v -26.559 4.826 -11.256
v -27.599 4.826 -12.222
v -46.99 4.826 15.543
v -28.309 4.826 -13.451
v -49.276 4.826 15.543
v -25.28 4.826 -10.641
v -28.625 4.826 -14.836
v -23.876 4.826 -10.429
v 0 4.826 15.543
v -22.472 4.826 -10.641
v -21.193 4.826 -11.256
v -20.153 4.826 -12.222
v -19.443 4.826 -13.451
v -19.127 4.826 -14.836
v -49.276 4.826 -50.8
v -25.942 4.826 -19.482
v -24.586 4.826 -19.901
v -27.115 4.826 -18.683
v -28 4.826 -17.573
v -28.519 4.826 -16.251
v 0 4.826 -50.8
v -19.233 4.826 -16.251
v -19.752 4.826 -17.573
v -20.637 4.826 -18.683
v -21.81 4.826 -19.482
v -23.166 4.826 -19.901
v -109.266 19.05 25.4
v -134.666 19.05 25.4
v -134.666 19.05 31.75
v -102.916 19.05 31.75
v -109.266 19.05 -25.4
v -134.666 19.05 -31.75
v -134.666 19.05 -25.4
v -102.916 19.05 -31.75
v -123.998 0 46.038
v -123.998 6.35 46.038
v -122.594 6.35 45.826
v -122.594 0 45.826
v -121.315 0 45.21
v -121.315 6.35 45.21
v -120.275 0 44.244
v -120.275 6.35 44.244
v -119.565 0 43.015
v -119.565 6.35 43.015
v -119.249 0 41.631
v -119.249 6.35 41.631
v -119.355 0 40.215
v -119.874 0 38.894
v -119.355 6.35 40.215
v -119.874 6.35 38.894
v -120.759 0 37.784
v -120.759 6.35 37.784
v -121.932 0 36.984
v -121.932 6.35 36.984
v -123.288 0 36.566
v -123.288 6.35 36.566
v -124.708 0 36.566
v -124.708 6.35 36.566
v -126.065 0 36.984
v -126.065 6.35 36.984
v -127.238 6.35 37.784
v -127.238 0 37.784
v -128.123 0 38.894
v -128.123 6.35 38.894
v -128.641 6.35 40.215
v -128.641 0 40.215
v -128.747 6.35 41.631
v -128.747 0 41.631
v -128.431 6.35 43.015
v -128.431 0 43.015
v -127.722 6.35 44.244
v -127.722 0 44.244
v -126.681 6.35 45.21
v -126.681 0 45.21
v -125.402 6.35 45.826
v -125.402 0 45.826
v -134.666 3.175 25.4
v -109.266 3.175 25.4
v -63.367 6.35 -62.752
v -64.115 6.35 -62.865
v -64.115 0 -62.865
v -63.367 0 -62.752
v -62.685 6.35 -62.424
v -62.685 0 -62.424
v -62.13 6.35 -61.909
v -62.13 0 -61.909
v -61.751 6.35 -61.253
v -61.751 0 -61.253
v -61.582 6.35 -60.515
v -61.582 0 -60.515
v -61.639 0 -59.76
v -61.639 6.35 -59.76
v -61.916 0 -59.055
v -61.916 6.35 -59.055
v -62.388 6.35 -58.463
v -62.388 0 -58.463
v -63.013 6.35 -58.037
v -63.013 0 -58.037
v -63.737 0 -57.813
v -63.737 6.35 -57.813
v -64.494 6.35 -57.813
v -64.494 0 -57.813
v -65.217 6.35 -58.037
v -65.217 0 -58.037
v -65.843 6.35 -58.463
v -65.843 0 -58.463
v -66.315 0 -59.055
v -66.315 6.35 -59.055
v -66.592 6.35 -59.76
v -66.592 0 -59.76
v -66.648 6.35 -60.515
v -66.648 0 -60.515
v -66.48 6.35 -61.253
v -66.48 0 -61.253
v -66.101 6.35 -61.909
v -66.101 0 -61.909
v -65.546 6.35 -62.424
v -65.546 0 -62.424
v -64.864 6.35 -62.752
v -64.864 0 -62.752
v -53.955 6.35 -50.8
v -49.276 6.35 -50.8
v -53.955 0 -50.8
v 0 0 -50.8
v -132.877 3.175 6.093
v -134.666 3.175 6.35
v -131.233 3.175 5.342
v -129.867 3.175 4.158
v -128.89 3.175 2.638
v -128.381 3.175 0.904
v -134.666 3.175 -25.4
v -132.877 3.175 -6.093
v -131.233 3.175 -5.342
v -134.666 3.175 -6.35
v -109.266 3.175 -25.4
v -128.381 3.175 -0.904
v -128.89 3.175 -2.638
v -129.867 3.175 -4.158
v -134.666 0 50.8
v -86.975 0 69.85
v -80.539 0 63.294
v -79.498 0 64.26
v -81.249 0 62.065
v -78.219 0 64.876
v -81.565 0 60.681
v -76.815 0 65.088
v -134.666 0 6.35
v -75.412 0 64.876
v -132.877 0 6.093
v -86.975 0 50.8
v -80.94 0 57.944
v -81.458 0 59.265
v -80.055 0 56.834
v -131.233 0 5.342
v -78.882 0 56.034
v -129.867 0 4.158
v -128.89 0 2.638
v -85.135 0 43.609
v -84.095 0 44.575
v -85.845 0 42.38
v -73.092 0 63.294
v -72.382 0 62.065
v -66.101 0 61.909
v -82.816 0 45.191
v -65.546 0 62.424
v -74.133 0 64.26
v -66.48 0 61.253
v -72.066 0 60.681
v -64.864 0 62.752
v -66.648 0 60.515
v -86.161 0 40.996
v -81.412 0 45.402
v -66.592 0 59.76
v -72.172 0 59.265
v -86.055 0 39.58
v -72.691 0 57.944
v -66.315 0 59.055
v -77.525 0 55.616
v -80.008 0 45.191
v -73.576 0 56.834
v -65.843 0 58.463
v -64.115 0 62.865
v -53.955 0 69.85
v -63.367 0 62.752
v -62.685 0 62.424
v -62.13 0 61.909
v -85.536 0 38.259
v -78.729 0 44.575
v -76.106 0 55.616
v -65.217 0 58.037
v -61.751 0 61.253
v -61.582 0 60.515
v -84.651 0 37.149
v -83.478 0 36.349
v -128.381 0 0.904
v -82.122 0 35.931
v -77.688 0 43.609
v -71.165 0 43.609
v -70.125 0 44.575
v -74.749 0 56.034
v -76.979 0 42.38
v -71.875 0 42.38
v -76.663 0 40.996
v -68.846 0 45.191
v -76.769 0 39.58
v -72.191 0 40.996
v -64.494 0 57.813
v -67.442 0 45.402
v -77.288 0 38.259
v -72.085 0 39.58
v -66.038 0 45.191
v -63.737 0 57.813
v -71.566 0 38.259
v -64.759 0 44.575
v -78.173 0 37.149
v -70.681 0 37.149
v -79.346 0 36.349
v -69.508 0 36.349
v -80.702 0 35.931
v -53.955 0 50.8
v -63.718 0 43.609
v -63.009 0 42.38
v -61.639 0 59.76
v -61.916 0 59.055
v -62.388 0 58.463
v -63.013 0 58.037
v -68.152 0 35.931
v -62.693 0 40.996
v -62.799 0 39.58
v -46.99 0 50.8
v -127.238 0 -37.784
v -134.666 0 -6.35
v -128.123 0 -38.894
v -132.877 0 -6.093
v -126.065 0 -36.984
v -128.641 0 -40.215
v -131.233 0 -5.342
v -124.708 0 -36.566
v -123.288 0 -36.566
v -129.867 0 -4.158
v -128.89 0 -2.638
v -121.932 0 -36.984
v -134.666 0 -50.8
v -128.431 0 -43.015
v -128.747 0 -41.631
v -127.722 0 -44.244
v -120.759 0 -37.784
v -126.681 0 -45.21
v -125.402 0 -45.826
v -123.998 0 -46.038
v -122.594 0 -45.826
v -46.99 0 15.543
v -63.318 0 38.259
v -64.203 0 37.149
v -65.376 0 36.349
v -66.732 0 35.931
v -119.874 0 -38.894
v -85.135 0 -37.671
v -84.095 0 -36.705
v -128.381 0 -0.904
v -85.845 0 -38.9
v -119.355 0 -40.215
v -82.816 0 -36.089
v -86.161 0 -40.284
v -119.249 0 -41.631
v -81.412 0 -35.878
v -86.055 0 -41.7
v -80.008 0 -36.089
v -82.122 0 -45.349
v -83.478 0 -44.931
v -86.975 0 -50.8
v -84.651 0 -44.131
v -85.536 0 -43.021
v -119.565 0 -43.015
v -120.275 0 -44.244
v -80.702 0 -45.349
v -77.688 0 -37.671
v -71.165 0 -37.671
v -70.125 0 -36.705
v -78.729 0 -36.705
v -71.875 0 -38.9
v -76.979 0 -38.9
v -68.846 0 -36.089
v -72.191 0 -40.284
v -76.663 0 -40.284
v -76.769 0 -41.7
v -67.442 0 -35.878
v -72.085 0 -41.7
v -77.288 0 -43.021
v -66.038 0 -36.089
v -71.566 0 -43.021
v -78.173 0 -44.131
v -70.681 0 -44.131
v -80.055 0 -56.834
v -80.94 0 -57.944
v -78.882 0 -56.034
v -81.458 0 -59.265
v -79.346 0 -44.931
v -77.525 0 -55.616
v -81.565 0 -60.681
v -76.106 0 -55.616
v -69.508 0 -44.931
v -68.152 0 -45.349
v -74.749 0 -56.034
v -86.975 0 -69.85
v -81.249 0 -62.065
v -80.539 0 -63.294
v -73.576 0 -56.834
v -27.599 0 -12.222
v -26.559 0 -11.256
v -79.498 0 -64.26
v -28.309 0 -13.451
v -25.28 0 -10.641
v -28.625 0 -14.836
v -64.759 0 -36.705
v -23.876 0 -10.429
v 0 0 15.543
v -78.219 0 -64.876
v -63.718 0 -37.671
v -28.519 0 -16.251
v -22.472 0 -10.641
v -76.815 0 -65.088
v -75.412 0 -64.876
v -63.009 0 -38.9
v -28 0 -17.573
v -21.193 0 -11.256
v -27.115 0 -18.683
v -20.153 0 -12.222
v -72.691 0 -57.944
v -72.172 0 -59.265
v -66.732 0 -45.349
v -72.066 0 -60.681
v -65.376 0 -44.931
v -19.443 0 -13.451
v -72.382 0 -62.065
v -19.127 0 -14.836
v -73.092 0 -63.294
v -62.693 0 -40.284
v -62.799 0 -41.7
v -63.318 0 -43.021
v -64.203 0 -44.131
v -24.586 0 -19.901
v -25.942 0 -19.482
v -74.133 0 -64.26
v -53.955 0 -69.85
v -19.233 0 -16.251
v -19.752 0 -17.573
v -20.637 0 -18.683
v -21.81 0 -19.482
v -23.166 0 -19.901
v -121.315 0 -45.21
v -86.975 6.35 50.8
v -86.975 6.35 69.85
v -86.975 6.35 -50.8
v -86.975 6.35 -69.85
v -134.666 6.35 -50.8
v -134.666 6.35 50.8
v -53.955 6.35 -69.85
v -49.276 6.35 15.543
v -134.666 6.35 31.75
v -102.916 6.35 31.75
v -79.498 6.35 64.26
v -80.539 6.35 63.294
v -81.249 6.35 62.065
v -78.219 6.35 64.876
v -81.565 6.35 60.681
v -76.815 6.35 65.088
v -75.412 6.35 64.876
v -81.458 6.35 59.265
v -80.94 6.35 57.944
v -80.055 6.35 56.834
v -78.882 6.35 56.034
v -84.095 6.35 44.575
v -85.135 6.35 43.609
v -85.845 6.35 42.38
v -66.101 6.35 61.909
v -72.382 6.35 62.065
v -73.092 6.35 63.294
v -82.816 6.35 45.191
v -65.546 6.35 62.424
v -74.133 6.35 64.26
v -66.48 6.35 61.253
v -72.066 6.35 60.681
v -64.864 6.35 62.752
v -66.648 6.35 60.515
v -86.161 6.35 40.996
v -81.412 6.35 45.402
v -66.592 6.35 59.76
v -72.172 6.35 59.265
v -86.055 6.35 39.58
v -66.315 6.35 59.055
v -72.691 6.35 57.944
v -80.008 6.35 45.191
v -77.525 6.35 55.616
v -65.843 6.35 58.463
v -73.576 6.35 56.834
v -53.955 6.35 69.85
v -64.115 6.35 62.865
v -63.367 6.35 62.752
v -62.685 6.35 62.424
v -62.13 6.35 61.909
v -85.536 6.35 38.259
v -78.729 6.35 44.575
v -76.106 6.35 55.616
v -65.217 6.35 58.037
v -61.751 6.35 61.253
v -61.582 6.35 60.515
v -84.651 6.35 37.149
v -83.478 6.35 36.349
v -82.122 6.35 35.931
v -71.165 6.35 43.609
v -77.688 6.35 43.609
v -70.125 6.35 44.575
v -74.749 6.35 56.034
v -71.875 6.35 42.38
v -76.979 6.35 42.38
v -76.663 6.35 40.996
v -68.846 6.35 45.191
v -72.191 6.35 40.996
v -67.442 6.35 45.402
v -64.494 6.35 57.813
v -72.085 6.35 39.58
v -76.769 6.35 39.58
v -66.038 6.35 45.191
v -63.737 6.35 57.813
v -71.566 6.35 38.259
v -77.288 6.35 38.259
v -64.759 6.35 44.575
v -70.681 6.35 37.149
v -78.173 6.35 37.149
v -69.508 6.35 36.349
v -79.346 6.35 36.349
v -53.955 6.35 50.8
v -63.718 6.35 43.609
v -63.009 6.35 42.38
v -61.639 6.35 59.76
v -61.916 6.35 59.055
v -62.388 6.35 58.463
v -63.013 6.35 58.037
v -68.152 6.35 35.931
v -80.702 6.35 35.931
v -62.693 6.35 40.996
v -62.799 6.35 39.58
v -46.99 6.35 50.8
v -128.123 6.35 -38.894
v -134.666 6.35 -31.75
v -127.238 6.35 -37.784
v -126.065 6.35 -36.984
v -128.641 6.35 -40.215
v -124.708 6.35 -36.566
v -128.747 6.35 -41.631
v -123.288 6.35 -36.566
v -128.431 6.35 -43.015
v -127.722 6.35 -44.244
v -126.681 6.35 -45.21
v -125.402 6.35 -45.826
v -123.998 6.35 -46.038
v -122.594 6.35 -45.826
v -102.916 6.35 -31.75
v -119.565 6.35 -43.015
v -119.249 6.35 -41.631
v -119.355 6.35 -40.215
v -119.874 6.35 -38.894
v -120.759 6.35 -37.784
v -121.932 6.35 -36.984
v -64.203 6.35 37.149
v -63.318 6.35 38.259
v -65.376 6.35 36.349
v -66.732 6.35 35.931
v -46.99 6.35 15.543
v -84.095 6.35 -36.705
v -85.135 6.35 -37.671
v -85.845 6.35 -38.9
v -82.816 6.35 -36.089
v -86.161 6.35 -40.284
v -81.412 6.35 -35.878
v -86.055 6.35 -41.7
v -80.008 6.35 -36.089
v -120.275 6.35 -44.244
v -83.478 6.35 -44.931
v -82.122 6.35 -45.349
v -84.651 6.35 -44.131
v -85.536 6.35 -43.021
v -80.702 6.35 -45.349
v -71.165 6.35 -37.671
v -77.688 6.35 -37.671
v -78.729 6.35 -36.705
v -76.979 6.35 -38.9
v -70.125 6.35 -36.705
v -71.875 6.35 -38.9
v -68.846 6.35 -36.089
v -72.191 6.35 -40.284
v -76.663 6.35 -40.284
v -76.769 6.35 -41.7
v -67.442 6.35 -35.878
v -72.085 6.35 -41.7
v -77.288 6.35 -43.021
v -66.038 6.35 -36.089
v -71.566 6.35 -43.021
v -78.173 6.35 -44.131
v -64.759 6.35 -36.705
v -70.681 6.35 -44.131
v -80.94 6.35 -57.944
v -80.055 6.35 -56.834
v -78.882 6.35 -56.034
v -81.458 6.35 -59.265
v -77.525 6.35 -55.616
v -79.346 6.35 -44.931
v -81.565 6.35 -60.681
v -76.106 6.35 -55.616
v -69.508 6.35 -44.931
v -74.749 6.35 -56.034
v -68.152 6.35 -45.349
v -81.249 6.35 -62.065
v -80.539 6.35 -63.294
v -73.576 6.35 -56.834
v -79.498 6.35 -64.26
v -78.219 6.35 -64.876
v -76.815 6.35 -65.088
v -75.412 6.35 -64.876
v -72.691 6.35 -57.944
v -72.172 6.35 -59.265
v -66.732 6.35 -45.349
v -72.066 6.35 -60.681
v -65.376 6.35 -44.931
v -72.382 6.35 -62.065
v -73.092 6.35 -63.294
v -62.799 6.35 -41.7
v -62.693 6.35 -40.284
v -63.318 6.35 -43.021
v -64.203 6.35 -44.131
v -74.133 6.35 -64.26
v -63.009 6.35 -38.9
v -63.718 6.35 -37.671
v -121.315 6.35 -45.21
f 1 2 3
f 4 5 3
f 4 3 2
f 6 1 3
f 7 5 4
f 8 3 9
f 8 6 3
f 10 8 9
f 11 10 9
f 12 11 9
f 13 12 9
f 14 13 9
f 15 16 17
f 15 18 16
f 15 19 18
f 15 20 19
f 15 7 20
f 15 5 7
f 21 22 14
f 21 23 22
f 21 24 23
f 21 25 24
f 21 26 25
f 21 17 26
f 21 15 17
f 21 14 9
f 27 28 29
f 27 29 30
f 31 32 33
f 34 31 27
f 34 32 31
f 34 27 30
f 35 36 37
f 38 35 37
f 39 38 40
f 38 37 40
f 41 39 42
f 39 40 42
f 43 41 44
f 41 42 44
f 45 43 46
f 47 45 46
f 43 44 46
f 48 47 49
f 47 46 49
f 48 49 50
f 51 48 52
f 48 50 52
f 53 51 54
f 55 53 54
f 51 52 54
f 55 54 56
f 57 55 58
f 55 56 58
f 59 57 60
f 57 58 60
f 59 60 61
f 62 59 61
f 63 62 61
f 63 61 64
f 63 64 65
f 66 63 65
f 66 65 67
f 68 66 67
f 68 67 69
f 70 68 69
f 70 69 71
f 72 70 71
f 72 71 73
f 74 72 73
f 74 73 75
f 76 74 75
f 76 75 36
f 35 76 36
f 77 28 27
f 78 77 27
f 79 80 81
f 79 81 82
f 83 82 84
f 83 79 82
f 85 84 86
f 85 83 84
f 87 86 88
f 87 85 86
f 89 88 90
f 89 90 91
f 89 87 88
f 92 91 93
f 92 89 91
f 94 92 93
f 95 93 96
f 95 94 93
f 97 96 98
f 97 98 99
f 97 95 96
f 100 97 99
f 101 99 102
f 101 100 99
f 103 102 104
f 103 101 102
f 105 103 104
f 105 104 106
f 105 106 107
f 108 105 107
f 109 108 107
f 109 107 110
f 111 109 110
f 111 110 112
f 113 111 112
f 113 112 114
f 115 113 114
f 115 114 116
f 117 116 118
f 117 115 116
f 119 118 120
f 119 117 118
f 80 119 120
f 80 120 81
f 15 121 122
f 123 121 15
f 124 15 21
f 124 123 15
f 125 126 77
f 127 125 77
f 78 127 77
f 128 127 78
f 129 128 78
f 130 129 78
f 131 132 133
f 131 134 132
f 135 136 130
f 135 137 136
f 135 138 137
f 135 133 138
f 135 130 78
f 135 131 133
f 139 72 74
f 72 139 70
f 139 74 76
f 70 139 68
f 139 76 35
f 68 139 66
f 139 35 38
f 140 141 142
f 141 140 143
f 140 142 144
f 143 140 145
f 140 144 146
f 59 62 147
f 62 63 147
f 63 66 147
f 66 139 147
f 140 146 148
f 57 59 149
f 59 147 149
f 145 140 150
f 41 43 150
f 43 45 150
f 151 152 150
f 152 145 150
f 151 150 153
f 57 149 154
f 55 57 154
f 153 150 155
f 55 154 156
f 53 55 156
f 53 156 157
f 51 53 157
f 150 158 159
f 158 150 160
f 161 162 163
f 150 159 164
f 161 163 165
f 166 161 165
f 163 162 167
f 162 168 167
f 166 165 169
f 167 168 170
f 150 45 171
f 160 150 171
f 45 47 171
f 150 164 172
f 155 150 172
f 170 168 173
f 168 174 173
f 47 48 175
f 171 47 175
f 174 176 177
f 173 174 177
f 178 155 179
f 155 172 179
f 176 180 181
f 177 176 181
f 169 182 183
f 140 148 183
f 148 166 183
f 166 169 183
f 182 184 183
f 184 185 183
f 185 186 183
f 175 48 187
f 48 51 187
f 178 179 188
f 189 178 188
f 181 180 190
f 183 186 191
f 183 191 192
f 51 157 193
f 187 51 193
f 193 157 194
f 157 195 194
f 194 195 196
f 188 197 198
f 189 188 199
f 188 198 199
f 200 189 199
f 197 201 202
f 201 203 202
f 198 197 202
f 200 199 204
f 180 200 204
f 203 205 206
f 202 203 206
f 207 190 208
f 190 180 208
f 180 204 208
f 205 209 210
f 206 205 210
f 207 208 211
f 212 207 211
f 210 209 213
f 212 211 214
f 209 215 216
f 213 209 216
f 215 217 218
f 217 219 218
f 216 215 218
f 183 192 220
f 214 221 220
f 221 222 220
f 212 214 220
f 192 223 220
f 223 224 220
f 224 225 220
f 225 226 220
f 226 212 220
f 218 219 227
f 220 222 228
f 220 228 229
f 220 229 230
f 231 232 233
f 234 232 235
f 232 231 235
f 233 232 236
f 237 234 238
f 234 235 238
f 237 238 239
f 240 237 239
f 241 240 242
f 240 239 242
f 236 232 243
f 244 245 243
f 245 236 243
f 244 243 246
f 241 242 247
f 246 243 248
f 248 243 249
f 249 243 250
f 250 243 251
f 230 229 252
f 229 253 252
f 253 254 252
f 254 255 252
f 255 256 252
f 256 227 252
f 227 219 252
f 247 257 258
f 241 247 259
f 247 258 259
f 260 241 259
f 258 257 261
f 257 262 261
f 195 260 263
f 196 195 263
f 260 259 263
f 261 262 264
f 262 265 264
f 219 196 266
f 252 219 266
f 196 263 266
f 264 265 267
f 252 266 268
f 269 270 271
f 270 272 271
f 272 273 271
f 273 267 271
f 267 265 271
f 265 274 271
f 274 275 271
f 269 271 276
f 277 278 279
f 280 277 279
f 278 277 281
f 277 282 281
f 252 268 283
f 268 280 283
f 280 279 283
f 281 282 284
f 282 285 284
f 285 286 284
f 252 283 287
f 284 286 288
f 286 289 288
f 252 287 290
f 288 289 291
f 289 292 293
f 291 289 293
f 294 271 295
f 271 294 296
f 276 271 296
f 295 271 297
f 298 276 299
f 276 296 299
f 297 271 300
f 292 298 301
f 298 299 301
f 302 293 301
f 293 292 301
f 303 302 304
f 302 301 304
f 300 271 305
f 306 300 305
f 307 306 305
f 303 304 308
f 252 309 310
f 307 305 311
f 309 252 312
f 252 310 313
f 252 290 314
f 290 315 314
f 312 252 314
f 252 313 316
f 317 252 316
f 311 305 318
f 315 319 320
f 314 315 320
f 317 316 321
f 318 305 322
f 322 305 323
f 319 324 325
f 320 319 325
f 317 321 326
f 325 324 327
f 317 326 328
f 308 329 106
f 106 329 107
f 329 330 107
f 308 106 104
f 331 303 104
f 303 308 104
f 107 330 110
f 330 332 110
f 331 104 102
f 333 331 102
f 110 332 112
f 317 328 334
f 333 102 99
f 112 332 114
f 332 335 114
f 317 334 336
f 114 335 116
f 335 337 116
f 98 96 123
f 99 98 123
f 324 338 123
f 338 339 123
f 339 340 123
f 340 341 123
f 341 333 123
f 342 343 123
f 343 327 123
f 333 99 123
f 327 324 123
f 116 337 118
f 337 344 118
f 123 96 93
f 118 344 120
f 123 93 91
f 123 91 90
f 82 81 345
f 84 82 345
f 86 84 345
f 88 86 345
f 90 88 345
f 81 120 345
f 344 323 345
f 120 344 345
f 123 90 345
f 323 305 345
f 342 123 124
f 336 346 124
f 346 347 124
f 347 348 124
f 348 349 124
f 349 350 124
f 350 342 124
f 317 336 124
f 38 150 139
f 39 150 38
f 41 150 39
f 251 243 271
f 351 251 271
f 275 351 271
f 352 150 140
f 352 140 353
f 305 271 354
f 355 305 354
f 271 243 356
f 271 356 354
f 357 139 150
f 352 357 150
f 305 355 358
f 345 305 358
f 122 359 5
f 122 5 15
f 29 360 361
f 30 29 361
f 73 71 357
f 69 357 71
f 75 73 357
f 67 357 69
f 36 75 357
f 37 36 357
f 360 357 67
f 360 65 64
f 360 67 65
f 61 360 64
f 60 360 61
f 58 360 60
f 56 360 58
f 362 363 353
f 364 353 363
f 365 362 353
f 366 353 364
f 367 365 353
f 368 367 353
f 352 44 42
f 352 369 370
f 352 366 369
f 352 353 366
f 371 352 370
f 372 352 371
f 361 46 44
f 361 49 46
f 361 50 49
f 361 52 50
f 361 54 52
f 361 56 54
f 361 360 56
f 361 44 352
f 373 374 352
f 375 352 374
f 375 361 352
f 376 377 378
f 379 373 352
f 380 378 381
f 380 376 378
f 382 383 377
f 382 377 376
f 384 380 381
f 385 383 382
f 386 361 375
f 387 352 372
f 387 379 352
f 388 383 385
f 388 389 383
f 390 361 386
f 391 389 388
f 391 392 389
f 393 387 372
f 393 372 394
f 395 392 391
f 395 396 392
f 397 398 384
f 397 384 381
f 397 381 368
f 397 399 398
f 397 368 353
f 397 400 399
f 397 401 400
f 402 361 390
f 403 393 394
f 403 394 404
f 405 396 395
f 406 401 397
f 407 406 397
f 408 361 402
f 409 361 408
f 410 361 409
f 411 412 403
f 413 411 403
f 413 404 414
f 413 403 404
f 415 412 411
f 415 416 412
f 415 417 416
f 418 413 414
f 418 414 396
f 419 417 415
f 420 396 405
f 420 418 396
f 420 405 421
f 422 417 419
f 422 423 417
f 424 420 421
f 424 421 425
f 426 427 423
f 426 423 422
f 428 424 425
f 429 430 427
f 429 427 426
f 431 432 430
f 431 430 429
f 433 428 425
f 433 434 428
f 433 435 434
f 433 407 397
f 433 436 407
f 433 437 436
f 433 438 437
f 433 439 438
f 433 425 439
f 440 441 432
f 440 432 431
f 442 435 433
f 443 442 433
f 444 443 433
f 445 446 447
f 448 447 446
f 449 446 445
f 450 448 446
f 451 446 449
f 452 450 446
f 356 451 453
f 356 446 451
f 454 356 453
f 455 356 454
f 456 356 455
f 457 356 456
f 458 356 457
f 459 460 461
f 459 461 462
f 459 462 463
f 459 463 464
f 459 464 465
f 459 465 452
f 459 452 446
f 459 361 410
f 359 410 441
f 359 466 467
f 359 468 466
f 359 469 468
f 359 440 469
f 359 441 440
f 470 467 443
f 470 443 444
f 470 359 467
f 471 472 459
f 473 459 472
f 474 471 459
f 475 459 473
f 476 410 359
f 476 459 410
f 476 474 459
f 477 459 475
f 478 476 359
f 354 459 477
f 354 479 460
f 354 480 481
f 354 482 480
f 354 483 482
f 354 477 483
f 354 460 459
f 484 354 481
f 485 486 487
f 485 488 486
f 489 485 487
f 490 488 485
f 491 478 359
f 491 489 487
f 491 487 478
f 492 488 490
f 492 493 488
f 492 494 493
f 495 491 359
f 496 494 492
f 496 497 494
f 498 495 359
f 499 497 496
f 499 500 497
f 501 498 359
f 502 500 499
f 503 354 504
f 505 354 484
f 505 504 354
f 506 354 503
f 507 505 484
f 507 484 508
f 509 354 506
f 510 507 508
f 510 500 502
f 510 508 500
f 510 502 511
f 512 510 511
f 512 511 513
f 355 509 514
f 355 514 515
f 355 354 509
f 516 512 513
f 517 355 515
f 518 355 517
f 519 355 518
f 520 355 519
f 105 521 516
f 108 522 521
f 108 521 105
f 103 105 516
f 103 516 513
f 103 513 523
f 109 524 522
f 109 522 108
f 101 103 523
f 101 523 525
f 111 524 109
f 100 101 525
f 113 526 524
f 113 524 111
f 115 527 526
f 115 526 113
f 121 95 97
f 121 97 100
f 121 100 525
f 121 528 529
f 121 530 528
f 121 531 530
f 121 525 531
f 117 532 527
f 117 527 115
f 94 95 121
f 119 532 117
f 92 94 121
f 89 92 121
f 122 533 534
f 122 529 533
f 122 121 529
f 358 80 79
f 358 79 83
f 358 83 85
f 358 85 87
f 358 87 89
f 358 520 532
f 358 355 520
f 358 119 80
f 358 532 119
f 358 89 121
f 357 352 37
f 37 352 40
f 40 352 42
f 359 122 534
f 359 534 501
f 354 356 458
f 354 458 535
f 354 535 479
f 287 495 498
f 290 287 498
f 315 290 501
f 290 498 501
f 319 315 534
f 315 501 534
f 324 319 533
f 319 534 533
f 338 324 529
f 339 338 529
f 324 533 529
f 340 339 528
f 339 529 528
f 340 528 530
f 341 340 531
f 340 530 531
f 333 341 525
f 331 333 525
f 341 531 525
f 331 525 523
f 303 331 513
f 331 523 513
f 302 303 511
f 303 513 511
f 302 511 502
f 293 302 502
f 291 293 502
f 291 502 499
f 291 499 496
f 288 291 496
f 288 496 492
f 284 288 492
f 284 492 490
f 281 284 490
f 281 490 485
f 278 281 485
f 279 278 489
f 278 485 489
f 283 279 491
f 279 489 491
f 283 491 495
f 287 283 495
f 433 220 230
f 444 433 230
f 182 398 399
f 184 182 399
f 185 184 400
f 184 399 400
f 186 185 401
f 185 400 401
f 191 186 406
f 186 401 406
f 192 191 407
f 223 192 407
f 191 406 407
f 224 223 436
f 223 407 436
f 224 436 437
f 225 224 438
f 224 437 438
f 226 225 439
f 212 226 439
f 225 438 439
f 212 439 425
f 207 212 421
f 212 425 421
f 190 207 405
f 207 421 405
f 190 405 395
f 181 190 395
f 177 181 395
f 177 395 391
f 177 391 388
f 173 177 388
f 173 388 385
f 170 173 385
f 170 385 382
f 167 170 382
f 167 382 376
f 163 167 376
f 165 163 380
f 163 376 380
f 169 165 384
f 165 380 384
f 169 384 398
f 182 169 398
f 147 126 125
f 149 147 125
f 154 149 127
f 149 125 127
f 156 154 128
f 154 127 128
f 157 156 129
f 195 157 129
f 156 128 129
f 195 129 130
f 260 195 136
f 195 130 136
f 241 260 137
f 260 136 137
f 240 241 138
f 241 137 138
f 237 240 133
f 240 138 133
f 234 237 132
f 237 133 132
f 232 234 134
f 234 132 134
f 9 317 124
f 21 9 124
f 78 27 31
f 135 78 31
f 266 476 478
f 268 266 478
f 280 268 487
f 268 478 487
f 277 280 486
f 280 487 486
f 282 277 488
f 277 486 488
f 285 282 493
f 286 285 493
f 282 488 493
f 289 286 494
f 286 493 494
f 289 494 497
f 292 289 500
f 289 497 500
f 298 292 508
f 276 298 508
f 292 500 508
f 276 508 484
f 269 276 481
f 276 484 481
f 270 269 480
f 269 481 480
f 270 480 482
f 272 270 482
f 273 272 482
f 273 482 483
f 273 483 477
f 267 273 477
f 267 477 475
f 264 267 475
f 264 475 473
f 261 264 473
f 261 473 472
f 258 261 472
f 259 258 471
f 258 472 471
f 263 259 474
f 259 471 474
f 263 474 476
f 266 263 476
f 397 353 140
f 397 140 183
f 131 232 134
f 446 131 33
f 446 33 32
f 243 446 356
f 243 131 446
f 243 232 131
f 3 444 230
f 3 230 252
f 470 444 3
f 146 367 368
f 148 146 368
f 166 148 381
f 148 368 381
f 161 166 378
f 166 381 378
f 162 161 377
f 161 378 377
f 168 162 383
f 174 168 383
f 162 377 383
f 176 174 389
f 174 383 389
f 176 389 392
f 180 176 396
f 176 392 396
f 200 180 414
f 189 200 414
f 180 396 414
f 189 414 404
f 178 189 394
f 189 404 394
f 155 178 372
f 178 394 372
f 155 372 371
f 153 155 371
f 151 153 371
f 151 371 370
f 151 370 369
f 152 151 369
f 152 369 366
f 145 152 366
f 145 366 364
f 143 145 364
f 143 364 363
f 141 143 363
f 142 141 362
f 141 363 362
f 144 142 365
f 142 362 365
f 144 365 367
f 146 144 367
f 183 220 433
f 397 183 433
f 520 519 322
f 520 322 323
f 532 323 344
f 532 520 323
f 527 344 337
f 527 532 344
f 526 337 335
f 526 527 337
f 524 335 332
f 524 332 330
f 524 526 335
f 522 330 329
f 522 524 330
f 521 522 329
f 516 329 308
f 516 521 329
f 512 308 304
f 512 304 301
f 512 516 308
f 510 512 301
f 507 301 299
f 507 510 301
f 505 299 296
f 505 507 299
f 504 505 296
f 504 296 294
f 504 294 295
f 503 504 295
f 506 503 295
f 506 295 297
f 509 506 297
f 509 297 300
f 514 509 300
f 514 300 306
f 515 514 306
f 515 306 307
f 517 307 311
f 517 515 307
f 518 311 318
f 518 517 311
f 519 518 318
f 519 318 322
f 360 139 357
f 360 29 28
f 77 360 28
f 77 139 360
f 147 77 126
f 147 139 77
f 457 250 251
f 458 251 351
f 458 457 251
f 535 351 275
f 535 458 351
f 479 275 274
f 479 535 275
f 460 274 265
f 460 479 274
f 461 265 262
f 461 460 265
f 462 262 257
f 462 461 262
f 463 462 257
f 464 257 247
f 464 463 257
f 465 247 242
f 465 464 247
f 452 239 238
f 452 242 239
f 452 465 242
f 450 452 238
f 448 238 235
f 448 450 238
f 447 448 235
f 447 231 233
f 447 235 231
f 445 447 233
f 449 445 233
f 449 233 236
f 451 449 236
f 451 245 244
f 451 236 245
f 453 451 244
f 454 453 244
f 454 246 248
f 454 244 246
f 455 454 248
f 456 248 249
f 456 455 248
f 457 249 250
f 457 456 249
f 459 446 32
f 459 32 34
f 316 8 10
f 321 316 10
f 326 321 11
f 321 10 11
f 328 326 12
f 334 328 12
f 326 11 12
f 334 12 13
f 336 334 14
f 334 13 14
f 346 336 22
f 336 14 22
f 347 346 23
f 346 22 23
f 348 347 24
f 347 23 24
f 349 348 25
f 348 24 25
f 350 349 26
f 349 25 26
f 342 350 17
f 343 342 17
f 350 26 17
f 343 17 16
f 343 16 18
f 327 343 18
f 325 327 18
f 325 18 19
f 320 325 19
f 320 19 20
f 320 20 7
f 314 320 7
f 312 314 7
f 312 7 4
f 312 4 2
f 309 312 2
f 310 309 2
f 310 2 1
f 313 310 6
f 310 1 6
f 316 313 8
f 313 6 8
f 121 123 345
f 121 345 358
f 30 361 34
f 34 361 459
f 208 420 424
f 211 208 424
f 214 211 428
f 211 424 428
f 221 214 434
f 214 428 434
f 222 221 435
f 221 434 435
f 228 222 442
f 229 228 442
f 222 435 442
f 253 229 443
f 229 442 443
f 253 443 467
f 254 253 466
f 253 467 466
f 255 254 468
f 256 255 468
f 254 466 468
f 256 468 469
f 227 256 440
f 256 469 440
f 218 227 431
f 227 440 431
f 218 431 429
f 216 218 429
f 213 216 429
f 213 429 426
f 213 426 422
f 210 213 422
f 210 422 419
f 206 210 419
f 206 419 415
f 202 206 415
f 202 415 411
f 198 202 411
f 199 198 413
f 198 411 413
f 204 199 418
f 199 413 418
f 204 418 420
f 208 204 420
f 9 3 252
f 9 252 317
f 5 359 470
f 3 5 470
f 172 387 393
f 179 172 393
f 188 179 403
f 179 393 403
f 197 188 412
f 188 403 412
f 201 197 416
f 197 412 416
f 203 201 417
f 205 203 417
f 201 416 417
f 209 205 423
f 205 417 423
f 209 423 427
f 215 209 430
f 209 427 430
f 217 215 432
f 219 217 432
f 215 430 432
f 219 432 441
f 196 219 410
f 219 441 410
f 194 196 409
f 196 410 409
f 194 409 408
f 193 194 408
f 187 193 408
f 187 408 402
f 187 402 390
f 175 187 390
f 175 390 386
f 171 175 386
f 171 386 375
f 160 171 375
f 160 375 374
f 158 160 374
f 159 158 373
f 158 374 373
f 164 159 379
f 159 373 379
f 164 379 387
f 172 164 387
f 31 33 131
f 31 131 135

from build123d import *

# Parameters (mm, degrees)
SKETCH1_W                 = 279.4
SKETCH1_H                 = 101.6
BOSS_EXTRUDE1_DEPTH       = 6.35
SKETCH2_R                 = 13.97
BOSS_EXTRUDE3_DEPTH       = 5.55625
SKETCH9_R                 = 11.1125
CUT_EXTRUDE4_DEPTH        = 4.445
CUT_EXTRUDE5_START        = -5.55625
SKETCH10_R                = 11.1125
CUT_EXTRUDE5_DEPTH        = 5.55625
SKETCH11_R                = 7.9375
CUT_EXTRUDE6_DEPTH        = 285.078633923
SKETCH12_R                = 6.35
CUT_EXTRUDE7_DEPTH        = 285.051619429
SKETCH22_W                = 63.5
SKETCH22_H                = 63.5
BOSS_EXTRUDE7_DEPTH       = 12.7
SKETCH25_W                = 50.8
SKETCH25_H                = 50.8
CUT_EXTRUDE11_DEPTH       = 15.875
SKETCH32_R                = 4.7625
CUT_EXTRUDE12_DEPTH       = 6.35
SKETCH38_W                = 46.99
SKETCH38_H                = 18.470251096
CUT_EXTRUDE13_DEPTH       = 6.35
SKETCH60_R                = 4.7625
CUT_EXTRUDE23_DEPTH       = 6.35
SKETCH64_R                = 4.7625
CUT_EXTRUDE24_DEPTH       = 285.264471927
SKETCH69_W                = 33.02
SKETCH69_H                = 6.35
BOSS_EXTRUDE10_DEPTH      = 19.05
SKETCH70_R                = 4.7625
SKETCH70_R_2              = 2.54
CUT_EXTRUDE26_DEPTH       = 6.35
SKETCH76_R                = 4.7625
CUT_EXTRUDE29_DEPTH       = 6.35
SKETCH77_W                = 46.99
SKETCH77_H                = 16.7871648
CUT_EXTRUDE30_DEPTH       = 6.35
SKETCH78_W                = 49.276
SKETCH78_H                = 66.342584104
CUT_EXTRUDE32_DEPTH       = 1.524
SKETCH79_R                = 4.7625
CUT_EXTRUDE33_DEPTH       = 4.826
CUT_EXTRUDE34_START       = -3.175
CUT_EXTRUDE34_OUTLINE_R   = 4.7625
CUT_EXTRUDE34_OUTLINE_R_2 = 7.9375
CUT_EXTRUDE34_DEPTH       = 19.05


# Read off the part's stored shape, not the designer's step: Cut-Extrude34
with BuildPart() as part:
    # Sketch1 → Boss-Extrude1 (new body)
    with BuildSketch(Plane(origin=(0, 0, 0), x_dir=(1, 0, 0), z_dir=(0, 1, 0))):
        with Locations((-139.7, 0)):
            Rectangle(SKETCH1_W, SKETCH1_H)
    extrude(amount=BOSS_EXTRUDE1_DEPTH)

    # Sketch2 → Boss-Extrude3 (add)
    with BuildSketch(Plane(origin=(0, 6.35, 0), x_dir=(1, 0, 0), z_dir=(0, 1, 0))):
        with Locations(Location((-258.510557857, 0, 0), (0, 0, 90))):
            Circle(SKETCH2_R)
    extrude(amount=BOSS_EXTRUDE3_DEPTH)

    # Sketch9 → Cut-Extrude4 (cut)
    with BuildSketch(Plane(origin=(0, 11.90625, 0), x_dir=(1, 0, 0), z_dir=(0, 1, 0))):
        with Locations(Location((-258.510557857, 0, 0), (0, 0, 270))):
            Circle(SKETCH9_R)
    extrude(amount=-CUT_EXTRUDE4_DEPTH, mode=Mode.SUBTRACT)

    # Sketch10 → Cut-Extrude5 (cut)
    with BuildSketch(Plane(origin=(0, 0, 0), x_dir=(-1, 0, 0), z_dir=(0, -1, 0)).offset(CUT_EXTRUDE5_START)):
        with Locations(Location((258.510557857, 0, 0), (0, 0, 270))):
            Circle(SKETCH10_R)
    extrude(amount=CUT_EXTRUDE5_DEPTH, mode=Mode.SUBTRACT)

    # Sketch11 → Cut-Extrude6 (cut, through all)
    with BuildSketch(Plane(origin=(0, 7.46125, 0), x_dir=(1, 0, 0), z_dir=(0, 1, 0))):
        with Locations(Location((-258.510557857, 0, 0), (0, 0, 270))):
            Circle(SKETCH11_R)
    extrude(amount=-CUT_EXTRUDE6_DEPTH, mode=Mode.SUBTRACT)

    # Sketch12 → Cut-Extrude7 (cut, through all)
    with BuildSketch(Plane(origin=(0, 6.35, 0), x_dir=(1, 0, 0), z_dir=(0, 1, 0))):
        with Locations(Location((-134.666203771, 0, 0), (0, 0, 270))):
            Circle(SKETCH12_R)
    extrude(amount=-CUT_EXTRUDE7_DEPTH, mode=Mode.SUBTRACT)

    # Sketch22 → Boss-Extrude7 (add)
    with BuildSketch(Plane(origin=(0, 6.35, 0), x_dir=(1, 0, 0), z_dir=(0, 1, 0))):
        with Locations((-134.666203771, 0)):
            Rectangle(SKETCH22_W, SKETCH22_H)
    extrude(amount=BOSS_EXTRUDE7_DEPTH)

    # Sketch25 → Cut-Extrude11 (cut)
    with BuildSketch(Plane(origin=(0, 19.05, 0), x_dir=(1, 0, 0), z_dir=(0, 1, 0))):
        with Locations((-134.666203771, 0)):
            Rectangle(SKETCH25_W, SKETCH25_H)
    extrude(amount=-CUT_EXTRUDE11_DEPTH, mode=Mode.SUBTRACT)

    # Sketch32 → Cut-Extrude12 (cut)
    with BuildSketch(Plane(origin=(0, 6.35, 0), x_dir=(1, 0, 0), z_dir=(0, 1, 0))):
        with Locations(Location((-67.44195898, -40.64, 0), (0, 0, 270))):
            Circle(SKETCH32_R)
        with Locations(Location((-81.41195898, -40.64, 0), (0, 0, 270))):
            Circle(SKETCH32_R)
        with Locations(Location((-67.44195898, 40.64, 0), (0, 0, 270))):
            Circle(SKETCH32_R)
        with Locations(Location((-81.41195898, 40.64, 0), (0, 0, 270))):
            Circle(SKETCH32_R)
    extrude(amount=-CUT_EXTRUDE12_DEPTH, mode=Mode.SUBTRACT)

    # Sketch38 → Cut-Extrude13 (cut)
    with BuildSketch(Plane(origin=(0, 6.35, 0), x_dir=(1, 0, 0), z_dir=(0, 1, 0))):
        with Locations((-23.495, -24.777709652)):
            Rectangle(SKETCH38_W, SKETCH38_H)
    extrude(amount=-CUT_EXTRUDE13_DEPTH, mode=Mode.SUBTRACT)

    # Sketch60 → Cut-Extrude23 (cut)
    with BuildSketch(Plane(origin=(0, 6.35, 0), x_dir=(1, 0, 0), z_dir=(0, 1, 0))):
        with Locations(Location((-231.7492444, 41.324145444, 0), (0, 0, 270))):
            Circle(SKETCH60_R)
        with Locations(Location((-231.7492444, -39.369341378, 0), (0, 0, 270))):
            Circle(SKETCH60_R)
        with Locations(Location((-173.509244294, -39.369341378, 0), (0, 0, 270))):
            Circle(SKETCH60_R)
        with Locations(Location((-173.509244294, 41.324145444, 0), (0, 0, 270))):
            Circle(SKETCH60_R)
    extrude(amount=-CUT_EXTRUDE23_DEPTH, mode=Mode.SUBTRACT)

    # Sketch64 → Cut-Extrude24 (cut, through all)
    with BuildSketch(Plane(origin=(0, 6.35, 0), x_dir=(1, 0, 0), z_dir=(0, 1, 0))):
        with Locations(Location((-145.334203771, -41.275, 0), (0, 0, 270))):
            Circle(SKETCH64_R)
        with Locations(Location((-123.998203771, -41.275, 0), (0, 0, 270))):
            Circle(SKETCH64_R)
    cut_extrude24 = extrude(amount=-CUT_EXTRUDE24_DEPTH, mode=Mode.SUBTRACT)

    # Mirror1: Cut-Extrude24 across plane
    add(cut_extrude24.mirror(Plane.XY), mode=Mode.SUBTRACT)

    # Sketch69 → Boss-Extrude10 (add)
    with BuildSketch(Plane.XY.offset(50.8)):
        with Locations((-70.465355554, 3.175)):
            Rectangle(SKETCH69_W, SKETCH69_H)
    boss_extrude10 = extrude(amount=BOSS_EXTRUDE10_DEPTH)

    # Sketch70 → Cut-Extrude26 (cut)
    with BuildSketch(Plane(origin=(0, 6.35, 0), x_dir=(1, 0, 0), z_dir=(0, 1, 0))):
        with Locations(Location((-76.815355554, -60.325, 0), (0, 0, 270))):
            Circle(SKETCH70_R)
        with Locations(Location((-64.115355554, -60.325, 0), (0, 0, 270))):
            Circle(SKETCH70_R_2)
    cut_extrude26 = extrude(amount=-CUT_EXTRUDE26_DEPTH, mode=Mode.SUBTRACT)

    # Mirror2: Boss-Extrude10, Cut-Extrude26 across plane
    add(boss_extrude10.mirror(Plane.XY))
    add(cut_extrude26.mirror(Plane.XY), mode=Mode.SUBTRACT)

    # Sketch76 → Cut-Extrude29 (cut)
    with BuildSketch(Plane(origin=(0, 6.35, 0), x_dir=(1, 0, 0), z_dir=(0, 1, 0))):
        with Locations(Location((-264.668, 24.13, 0), (0, 0, 270))):
            Circle(SKETCH76_R)
        with Locations(Location((-252.222, 24.13, 0), (0, 0, 270))):
            Circle(SKETCH76_R)
    extrude(amount=-CUT_EXTRUDE29_DEPTH, mode=Mode.SUBTRACT)

    # Sketch77 → Cut-Extrude30 (cut)
    with BuildSketch(Plane(origin=(0, 6.35, 0), x_dir=(1, 0, 0), z_dir=(0, 1, 0))):
        with Locations((-23.495, -42.4064176)):
            Rectangle(SKETCH77_W, SKETCH77_H)
    extrude(amount=-CUT_EXTRUDE30_DEPTH, mode=Mode.SUBTRACT)

    # Sketch78 → Cut-Extrude32 (cut)
    with BuildSketch(Plane(origin=(0, 6.35, 0), x_dir=(1, 0, 0), z_dir=(0, 1, 0))):
        with Locations((-24.638, 17.628707948)):
            Rectangle(SKETCH78_W, SKETCH78_H)
    extrude(amount=-CUT_EXTRUDE32_DEPTH, mode=Mode.SUBTRACT)

    # Sketch79 → Cut-Extrude33 (cut)
    with BuildSketch(Plane(origin=(0, 4.826, 0), x_dir=(1, 0, 0), z_dir=(0, 1, 0))):
        with Locations(Location((-23.876, 15.191415896, 0), (0, 0, 270))):
            Circle(SKETCH79_R)
    extrude(amount=-CUT_EXTRUDE33_DEPTH, mode=Mode.SUBTRACT)

    # Cut-Extrude34 outline → Cut-Extrude34 (cut)
    with BuildSketch(Plane(origin=(0, 3.175, 0), x_dir=(1, 0, 0), z_dir=(0, 1, 0)).offset(CUT_EXTRUDE34_START)):
        with BuildLine():
            ThreePointArc((-134.666203771, -6.35), (-141.016203771, 0), (-134.666203771, 6.35))
            Line((-134.666203771, 6.35), (-134.666203771, 50.8))
            Line((-134.666203771, 50.8), (-279.4, 50.8))
            Line((-279.4, 50.8), (-279.4, -50.8))
            Line((-279.4, -50.8), (-134.666203771, -50.8))
            Line((-134.666203771, -50.8), (-134.666203771, -6.35))
        make_face()
        with Locations((-231.7492444, 41.324145444)):
            Circle(CUT_EXTRUDE34_OUTLINE_R, mode=Mode.SUBTRACT)
        with Locations((-173.509244294, 41.324145444)):
            Circle(CUT_EXTRUDE34_OUTLINE_R, mode=Mode.SUBTRACT)
        with Locations((-145.334203771, 41.275)):
            Circle(CUT_EXTRUDE34_OUTLINE_R, mode=Mode.SUBTRACT)
        with Locations((-231.7492444, -39.369341378)):
            Circle(CUT_EXTRUDE34_OUTLINE_R, mode=Mode.SUBTRACT)
        with Locations((-173.509244294, -39.369341378)):
            Circle(CUT_EXTRUDE34_OUTLINE_R, mode=Mode.SUBTRACT)
        with Locations((-145.334203771, -41.275)):
            Circle(CUT_EXTRUDE34_OUTLINE_R, mode=Mode.SUBTRACT)
        with Locations((-264.668, 24.13)):
            Circle(CUT_EXTRUDE34_OUTLINE_R, mode=Mode.SUBTRACT)
        with Locations((-252.222, 24.13)):
            Circle(CUT_EXTRUDE34_OUTLINE_R, mode=Mode.SUBTRACT)
        with Locations((-258.510557857, 0)):
            Circle(CUT_EXTRUDE34_OUTLINE_R_2, mode=Mode.SUBTRACT)
    extrude(amount=CUT_EXTRUDE34_DEPTH, mode=Mode.SUBTRACT)


solid = part.part
